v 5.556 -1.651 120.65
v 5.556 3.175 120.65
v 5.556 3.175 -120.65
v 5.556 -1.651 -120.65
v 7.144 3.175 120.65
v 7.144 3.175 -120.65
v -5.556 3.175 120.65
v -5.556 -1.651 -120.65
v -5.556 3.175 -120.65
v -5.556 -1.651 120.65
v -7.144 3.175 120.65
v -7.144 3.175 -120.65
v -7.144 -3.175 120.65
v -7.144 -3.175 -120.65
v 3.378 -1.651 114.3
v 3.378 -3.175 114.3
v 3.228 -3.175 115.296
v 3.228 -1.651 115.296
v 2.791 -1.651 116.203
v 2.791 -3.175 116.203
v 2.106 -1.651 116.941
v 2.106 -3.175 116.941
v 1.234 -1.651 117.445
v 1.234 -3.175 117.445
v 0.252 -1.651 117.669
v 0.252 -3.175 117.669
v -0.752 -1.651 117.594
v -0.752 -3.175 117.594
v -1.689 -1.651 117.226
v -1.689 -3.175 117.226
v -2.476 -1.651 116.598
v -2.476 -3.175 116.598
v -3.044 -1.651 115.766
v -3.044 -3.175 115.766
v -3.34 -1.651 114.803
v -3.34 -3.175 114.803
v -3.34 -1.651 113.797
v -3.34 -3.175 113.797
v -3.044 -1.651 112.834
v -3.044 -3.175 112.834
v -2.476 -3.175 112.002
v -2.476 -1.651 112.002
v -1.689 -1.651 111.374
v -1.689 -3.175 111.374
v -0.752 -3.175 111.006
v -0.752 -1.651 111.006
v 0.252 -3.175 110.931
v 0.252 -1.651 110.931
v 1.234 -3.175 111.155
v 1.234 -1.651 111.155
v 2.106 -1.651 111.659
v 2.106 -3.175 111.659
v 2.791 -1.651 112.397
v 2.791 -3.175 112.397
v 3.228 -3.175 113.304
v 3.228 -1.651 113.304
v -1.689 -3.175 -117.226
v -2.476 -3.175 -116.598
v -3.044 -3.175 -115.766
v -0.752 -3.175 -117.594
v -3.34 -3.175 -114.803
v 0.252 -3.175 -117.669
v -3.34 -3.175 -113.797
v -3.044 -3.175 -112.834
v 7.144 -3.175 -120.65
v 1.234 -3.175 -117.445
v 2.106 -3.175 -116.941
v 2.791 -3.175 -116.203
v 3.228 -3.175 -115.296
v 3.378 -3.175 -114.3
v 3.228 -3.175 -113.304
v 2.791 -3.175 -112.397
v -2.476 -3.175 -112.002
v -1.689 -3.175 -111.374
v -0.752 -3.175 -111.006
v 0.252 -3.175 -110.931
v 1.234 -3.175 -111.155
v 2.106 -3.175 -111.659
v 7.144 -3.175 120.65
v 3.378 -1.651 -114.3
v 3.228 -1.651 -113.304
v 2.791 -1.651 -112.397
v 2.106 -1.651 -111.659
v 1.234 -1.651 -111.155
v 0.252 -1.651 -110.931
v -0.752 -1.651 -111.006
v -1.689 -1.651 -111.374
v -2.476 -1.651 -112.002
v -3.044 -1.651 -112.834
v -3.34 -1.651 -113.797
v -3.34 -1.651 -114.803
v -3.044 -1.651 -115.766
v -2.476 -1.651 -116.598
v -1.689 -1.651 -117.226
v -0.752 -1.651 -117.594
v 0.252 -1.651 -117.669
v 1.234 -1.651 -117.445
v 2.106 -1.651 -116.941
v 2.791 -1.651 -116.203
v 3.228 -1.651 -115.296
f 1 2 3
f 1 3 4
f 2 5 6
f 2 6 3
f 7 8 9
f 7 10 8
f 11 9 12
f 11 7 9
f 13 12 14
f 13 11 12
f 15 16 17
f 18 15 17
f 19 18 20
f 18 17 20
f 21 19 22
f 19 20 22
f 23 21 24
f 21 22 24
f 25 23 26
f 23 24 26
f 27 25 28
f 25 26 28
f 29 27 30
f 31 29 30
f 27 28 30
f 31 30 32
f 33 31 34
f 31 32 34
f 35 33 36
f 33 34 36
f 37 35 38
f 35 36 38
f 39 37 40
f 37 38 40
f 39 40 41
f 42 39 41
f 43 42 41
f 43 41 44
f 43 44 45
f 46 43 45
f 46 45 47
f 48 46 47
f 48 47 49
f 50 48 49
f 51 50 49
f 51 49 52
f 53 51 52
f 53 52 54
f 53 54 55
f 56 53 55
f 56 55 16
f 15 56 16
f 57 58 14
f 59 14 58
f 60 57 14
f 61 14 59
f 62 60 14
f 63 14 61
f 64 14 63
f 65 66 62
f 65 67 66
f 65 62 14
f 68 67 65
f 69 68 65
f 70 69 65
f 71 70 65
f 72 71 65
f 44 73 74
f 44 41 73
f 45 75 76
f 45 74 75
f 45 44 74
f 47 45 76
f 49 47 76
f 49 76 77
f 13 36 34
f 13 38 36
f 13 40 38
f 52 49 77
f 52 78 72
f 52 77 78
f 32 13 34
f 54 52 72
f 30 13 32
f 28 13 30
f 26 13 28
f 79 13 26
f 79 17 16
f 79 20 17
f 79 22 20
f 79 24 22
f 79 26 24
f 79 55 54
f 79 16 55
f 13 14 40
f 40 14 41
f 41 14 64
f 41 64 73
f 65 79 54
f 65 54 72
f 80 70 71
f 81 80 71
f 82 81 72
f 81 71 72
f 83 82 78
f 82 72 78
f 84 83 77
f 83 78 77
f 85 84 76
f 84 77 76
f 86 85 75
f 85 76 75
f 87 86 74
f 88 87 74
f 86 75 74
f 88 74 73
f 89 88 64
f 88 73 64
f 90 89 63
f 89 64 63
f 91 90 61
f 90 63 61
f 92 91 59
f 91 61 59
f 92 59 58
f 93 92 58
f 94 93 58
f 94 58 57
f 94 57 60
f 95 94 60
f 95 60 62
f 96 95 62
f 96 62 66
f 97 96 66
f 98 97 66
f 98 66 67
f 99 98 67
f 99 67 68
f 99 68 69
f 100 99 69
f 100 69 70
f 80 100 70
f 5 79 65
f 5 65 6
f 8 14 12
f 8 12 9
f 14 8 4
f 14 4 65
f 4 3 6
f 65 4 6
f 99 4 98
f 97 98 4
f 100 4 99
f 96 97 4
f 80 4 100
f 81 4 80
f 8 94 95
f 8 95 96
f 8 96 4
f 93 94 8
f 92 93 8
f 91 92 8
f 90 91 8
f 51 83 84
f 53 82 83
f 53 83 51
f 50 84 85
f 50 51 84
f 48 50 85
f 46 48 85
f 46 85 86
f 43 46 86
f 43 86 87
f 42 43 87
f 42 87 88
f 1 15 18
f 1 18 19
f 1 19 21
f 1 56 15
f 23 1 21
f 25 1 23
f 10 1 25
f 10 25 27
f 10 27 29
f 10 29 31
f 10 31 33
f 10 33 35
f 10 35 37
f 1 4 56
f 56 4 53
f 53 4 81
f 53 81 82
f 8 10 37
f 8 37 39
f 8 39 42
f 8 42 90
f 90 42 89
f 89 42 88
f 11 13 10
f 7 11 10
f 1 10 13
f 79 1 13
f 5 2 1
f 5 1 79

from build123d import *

# Parameters (mm, degrees)
BOSS_EXTRUDE1_DEPTH     = 120.65
F_1_4_CLEARANCE_HOLE1_D = 6.7564


with BuildPart() as part:
    # Sketch2 → Boss-Extrude1 (new, symmetric)
    with BuildSketch(Plane.XY):
        Polygon((-7.14375, 3.175), (-7.14375, -3.175), (7.14375, -3.175), (7.14375, 3.175), (5.55625, 3.175), (5.55625, -1.651), (-5.55625, -1.651), (-5.55625, 3.175), align=None)
    extrude(amount=BOSS_EXTRUDE1_DEPTH, both=True)

    # 1/4 Clearance Hole1 (through all)
    with Locations(Plane(origin=(0, -1.651, 0), x_dir=(-1, 0, 0), z_dir=(0, 1, 0))):
        with Locations((0, -114.3), (0, 114.3)):
            Hole(F_1_4_CLEARANCE_HOLE1_D / 2)


solid = part.part
